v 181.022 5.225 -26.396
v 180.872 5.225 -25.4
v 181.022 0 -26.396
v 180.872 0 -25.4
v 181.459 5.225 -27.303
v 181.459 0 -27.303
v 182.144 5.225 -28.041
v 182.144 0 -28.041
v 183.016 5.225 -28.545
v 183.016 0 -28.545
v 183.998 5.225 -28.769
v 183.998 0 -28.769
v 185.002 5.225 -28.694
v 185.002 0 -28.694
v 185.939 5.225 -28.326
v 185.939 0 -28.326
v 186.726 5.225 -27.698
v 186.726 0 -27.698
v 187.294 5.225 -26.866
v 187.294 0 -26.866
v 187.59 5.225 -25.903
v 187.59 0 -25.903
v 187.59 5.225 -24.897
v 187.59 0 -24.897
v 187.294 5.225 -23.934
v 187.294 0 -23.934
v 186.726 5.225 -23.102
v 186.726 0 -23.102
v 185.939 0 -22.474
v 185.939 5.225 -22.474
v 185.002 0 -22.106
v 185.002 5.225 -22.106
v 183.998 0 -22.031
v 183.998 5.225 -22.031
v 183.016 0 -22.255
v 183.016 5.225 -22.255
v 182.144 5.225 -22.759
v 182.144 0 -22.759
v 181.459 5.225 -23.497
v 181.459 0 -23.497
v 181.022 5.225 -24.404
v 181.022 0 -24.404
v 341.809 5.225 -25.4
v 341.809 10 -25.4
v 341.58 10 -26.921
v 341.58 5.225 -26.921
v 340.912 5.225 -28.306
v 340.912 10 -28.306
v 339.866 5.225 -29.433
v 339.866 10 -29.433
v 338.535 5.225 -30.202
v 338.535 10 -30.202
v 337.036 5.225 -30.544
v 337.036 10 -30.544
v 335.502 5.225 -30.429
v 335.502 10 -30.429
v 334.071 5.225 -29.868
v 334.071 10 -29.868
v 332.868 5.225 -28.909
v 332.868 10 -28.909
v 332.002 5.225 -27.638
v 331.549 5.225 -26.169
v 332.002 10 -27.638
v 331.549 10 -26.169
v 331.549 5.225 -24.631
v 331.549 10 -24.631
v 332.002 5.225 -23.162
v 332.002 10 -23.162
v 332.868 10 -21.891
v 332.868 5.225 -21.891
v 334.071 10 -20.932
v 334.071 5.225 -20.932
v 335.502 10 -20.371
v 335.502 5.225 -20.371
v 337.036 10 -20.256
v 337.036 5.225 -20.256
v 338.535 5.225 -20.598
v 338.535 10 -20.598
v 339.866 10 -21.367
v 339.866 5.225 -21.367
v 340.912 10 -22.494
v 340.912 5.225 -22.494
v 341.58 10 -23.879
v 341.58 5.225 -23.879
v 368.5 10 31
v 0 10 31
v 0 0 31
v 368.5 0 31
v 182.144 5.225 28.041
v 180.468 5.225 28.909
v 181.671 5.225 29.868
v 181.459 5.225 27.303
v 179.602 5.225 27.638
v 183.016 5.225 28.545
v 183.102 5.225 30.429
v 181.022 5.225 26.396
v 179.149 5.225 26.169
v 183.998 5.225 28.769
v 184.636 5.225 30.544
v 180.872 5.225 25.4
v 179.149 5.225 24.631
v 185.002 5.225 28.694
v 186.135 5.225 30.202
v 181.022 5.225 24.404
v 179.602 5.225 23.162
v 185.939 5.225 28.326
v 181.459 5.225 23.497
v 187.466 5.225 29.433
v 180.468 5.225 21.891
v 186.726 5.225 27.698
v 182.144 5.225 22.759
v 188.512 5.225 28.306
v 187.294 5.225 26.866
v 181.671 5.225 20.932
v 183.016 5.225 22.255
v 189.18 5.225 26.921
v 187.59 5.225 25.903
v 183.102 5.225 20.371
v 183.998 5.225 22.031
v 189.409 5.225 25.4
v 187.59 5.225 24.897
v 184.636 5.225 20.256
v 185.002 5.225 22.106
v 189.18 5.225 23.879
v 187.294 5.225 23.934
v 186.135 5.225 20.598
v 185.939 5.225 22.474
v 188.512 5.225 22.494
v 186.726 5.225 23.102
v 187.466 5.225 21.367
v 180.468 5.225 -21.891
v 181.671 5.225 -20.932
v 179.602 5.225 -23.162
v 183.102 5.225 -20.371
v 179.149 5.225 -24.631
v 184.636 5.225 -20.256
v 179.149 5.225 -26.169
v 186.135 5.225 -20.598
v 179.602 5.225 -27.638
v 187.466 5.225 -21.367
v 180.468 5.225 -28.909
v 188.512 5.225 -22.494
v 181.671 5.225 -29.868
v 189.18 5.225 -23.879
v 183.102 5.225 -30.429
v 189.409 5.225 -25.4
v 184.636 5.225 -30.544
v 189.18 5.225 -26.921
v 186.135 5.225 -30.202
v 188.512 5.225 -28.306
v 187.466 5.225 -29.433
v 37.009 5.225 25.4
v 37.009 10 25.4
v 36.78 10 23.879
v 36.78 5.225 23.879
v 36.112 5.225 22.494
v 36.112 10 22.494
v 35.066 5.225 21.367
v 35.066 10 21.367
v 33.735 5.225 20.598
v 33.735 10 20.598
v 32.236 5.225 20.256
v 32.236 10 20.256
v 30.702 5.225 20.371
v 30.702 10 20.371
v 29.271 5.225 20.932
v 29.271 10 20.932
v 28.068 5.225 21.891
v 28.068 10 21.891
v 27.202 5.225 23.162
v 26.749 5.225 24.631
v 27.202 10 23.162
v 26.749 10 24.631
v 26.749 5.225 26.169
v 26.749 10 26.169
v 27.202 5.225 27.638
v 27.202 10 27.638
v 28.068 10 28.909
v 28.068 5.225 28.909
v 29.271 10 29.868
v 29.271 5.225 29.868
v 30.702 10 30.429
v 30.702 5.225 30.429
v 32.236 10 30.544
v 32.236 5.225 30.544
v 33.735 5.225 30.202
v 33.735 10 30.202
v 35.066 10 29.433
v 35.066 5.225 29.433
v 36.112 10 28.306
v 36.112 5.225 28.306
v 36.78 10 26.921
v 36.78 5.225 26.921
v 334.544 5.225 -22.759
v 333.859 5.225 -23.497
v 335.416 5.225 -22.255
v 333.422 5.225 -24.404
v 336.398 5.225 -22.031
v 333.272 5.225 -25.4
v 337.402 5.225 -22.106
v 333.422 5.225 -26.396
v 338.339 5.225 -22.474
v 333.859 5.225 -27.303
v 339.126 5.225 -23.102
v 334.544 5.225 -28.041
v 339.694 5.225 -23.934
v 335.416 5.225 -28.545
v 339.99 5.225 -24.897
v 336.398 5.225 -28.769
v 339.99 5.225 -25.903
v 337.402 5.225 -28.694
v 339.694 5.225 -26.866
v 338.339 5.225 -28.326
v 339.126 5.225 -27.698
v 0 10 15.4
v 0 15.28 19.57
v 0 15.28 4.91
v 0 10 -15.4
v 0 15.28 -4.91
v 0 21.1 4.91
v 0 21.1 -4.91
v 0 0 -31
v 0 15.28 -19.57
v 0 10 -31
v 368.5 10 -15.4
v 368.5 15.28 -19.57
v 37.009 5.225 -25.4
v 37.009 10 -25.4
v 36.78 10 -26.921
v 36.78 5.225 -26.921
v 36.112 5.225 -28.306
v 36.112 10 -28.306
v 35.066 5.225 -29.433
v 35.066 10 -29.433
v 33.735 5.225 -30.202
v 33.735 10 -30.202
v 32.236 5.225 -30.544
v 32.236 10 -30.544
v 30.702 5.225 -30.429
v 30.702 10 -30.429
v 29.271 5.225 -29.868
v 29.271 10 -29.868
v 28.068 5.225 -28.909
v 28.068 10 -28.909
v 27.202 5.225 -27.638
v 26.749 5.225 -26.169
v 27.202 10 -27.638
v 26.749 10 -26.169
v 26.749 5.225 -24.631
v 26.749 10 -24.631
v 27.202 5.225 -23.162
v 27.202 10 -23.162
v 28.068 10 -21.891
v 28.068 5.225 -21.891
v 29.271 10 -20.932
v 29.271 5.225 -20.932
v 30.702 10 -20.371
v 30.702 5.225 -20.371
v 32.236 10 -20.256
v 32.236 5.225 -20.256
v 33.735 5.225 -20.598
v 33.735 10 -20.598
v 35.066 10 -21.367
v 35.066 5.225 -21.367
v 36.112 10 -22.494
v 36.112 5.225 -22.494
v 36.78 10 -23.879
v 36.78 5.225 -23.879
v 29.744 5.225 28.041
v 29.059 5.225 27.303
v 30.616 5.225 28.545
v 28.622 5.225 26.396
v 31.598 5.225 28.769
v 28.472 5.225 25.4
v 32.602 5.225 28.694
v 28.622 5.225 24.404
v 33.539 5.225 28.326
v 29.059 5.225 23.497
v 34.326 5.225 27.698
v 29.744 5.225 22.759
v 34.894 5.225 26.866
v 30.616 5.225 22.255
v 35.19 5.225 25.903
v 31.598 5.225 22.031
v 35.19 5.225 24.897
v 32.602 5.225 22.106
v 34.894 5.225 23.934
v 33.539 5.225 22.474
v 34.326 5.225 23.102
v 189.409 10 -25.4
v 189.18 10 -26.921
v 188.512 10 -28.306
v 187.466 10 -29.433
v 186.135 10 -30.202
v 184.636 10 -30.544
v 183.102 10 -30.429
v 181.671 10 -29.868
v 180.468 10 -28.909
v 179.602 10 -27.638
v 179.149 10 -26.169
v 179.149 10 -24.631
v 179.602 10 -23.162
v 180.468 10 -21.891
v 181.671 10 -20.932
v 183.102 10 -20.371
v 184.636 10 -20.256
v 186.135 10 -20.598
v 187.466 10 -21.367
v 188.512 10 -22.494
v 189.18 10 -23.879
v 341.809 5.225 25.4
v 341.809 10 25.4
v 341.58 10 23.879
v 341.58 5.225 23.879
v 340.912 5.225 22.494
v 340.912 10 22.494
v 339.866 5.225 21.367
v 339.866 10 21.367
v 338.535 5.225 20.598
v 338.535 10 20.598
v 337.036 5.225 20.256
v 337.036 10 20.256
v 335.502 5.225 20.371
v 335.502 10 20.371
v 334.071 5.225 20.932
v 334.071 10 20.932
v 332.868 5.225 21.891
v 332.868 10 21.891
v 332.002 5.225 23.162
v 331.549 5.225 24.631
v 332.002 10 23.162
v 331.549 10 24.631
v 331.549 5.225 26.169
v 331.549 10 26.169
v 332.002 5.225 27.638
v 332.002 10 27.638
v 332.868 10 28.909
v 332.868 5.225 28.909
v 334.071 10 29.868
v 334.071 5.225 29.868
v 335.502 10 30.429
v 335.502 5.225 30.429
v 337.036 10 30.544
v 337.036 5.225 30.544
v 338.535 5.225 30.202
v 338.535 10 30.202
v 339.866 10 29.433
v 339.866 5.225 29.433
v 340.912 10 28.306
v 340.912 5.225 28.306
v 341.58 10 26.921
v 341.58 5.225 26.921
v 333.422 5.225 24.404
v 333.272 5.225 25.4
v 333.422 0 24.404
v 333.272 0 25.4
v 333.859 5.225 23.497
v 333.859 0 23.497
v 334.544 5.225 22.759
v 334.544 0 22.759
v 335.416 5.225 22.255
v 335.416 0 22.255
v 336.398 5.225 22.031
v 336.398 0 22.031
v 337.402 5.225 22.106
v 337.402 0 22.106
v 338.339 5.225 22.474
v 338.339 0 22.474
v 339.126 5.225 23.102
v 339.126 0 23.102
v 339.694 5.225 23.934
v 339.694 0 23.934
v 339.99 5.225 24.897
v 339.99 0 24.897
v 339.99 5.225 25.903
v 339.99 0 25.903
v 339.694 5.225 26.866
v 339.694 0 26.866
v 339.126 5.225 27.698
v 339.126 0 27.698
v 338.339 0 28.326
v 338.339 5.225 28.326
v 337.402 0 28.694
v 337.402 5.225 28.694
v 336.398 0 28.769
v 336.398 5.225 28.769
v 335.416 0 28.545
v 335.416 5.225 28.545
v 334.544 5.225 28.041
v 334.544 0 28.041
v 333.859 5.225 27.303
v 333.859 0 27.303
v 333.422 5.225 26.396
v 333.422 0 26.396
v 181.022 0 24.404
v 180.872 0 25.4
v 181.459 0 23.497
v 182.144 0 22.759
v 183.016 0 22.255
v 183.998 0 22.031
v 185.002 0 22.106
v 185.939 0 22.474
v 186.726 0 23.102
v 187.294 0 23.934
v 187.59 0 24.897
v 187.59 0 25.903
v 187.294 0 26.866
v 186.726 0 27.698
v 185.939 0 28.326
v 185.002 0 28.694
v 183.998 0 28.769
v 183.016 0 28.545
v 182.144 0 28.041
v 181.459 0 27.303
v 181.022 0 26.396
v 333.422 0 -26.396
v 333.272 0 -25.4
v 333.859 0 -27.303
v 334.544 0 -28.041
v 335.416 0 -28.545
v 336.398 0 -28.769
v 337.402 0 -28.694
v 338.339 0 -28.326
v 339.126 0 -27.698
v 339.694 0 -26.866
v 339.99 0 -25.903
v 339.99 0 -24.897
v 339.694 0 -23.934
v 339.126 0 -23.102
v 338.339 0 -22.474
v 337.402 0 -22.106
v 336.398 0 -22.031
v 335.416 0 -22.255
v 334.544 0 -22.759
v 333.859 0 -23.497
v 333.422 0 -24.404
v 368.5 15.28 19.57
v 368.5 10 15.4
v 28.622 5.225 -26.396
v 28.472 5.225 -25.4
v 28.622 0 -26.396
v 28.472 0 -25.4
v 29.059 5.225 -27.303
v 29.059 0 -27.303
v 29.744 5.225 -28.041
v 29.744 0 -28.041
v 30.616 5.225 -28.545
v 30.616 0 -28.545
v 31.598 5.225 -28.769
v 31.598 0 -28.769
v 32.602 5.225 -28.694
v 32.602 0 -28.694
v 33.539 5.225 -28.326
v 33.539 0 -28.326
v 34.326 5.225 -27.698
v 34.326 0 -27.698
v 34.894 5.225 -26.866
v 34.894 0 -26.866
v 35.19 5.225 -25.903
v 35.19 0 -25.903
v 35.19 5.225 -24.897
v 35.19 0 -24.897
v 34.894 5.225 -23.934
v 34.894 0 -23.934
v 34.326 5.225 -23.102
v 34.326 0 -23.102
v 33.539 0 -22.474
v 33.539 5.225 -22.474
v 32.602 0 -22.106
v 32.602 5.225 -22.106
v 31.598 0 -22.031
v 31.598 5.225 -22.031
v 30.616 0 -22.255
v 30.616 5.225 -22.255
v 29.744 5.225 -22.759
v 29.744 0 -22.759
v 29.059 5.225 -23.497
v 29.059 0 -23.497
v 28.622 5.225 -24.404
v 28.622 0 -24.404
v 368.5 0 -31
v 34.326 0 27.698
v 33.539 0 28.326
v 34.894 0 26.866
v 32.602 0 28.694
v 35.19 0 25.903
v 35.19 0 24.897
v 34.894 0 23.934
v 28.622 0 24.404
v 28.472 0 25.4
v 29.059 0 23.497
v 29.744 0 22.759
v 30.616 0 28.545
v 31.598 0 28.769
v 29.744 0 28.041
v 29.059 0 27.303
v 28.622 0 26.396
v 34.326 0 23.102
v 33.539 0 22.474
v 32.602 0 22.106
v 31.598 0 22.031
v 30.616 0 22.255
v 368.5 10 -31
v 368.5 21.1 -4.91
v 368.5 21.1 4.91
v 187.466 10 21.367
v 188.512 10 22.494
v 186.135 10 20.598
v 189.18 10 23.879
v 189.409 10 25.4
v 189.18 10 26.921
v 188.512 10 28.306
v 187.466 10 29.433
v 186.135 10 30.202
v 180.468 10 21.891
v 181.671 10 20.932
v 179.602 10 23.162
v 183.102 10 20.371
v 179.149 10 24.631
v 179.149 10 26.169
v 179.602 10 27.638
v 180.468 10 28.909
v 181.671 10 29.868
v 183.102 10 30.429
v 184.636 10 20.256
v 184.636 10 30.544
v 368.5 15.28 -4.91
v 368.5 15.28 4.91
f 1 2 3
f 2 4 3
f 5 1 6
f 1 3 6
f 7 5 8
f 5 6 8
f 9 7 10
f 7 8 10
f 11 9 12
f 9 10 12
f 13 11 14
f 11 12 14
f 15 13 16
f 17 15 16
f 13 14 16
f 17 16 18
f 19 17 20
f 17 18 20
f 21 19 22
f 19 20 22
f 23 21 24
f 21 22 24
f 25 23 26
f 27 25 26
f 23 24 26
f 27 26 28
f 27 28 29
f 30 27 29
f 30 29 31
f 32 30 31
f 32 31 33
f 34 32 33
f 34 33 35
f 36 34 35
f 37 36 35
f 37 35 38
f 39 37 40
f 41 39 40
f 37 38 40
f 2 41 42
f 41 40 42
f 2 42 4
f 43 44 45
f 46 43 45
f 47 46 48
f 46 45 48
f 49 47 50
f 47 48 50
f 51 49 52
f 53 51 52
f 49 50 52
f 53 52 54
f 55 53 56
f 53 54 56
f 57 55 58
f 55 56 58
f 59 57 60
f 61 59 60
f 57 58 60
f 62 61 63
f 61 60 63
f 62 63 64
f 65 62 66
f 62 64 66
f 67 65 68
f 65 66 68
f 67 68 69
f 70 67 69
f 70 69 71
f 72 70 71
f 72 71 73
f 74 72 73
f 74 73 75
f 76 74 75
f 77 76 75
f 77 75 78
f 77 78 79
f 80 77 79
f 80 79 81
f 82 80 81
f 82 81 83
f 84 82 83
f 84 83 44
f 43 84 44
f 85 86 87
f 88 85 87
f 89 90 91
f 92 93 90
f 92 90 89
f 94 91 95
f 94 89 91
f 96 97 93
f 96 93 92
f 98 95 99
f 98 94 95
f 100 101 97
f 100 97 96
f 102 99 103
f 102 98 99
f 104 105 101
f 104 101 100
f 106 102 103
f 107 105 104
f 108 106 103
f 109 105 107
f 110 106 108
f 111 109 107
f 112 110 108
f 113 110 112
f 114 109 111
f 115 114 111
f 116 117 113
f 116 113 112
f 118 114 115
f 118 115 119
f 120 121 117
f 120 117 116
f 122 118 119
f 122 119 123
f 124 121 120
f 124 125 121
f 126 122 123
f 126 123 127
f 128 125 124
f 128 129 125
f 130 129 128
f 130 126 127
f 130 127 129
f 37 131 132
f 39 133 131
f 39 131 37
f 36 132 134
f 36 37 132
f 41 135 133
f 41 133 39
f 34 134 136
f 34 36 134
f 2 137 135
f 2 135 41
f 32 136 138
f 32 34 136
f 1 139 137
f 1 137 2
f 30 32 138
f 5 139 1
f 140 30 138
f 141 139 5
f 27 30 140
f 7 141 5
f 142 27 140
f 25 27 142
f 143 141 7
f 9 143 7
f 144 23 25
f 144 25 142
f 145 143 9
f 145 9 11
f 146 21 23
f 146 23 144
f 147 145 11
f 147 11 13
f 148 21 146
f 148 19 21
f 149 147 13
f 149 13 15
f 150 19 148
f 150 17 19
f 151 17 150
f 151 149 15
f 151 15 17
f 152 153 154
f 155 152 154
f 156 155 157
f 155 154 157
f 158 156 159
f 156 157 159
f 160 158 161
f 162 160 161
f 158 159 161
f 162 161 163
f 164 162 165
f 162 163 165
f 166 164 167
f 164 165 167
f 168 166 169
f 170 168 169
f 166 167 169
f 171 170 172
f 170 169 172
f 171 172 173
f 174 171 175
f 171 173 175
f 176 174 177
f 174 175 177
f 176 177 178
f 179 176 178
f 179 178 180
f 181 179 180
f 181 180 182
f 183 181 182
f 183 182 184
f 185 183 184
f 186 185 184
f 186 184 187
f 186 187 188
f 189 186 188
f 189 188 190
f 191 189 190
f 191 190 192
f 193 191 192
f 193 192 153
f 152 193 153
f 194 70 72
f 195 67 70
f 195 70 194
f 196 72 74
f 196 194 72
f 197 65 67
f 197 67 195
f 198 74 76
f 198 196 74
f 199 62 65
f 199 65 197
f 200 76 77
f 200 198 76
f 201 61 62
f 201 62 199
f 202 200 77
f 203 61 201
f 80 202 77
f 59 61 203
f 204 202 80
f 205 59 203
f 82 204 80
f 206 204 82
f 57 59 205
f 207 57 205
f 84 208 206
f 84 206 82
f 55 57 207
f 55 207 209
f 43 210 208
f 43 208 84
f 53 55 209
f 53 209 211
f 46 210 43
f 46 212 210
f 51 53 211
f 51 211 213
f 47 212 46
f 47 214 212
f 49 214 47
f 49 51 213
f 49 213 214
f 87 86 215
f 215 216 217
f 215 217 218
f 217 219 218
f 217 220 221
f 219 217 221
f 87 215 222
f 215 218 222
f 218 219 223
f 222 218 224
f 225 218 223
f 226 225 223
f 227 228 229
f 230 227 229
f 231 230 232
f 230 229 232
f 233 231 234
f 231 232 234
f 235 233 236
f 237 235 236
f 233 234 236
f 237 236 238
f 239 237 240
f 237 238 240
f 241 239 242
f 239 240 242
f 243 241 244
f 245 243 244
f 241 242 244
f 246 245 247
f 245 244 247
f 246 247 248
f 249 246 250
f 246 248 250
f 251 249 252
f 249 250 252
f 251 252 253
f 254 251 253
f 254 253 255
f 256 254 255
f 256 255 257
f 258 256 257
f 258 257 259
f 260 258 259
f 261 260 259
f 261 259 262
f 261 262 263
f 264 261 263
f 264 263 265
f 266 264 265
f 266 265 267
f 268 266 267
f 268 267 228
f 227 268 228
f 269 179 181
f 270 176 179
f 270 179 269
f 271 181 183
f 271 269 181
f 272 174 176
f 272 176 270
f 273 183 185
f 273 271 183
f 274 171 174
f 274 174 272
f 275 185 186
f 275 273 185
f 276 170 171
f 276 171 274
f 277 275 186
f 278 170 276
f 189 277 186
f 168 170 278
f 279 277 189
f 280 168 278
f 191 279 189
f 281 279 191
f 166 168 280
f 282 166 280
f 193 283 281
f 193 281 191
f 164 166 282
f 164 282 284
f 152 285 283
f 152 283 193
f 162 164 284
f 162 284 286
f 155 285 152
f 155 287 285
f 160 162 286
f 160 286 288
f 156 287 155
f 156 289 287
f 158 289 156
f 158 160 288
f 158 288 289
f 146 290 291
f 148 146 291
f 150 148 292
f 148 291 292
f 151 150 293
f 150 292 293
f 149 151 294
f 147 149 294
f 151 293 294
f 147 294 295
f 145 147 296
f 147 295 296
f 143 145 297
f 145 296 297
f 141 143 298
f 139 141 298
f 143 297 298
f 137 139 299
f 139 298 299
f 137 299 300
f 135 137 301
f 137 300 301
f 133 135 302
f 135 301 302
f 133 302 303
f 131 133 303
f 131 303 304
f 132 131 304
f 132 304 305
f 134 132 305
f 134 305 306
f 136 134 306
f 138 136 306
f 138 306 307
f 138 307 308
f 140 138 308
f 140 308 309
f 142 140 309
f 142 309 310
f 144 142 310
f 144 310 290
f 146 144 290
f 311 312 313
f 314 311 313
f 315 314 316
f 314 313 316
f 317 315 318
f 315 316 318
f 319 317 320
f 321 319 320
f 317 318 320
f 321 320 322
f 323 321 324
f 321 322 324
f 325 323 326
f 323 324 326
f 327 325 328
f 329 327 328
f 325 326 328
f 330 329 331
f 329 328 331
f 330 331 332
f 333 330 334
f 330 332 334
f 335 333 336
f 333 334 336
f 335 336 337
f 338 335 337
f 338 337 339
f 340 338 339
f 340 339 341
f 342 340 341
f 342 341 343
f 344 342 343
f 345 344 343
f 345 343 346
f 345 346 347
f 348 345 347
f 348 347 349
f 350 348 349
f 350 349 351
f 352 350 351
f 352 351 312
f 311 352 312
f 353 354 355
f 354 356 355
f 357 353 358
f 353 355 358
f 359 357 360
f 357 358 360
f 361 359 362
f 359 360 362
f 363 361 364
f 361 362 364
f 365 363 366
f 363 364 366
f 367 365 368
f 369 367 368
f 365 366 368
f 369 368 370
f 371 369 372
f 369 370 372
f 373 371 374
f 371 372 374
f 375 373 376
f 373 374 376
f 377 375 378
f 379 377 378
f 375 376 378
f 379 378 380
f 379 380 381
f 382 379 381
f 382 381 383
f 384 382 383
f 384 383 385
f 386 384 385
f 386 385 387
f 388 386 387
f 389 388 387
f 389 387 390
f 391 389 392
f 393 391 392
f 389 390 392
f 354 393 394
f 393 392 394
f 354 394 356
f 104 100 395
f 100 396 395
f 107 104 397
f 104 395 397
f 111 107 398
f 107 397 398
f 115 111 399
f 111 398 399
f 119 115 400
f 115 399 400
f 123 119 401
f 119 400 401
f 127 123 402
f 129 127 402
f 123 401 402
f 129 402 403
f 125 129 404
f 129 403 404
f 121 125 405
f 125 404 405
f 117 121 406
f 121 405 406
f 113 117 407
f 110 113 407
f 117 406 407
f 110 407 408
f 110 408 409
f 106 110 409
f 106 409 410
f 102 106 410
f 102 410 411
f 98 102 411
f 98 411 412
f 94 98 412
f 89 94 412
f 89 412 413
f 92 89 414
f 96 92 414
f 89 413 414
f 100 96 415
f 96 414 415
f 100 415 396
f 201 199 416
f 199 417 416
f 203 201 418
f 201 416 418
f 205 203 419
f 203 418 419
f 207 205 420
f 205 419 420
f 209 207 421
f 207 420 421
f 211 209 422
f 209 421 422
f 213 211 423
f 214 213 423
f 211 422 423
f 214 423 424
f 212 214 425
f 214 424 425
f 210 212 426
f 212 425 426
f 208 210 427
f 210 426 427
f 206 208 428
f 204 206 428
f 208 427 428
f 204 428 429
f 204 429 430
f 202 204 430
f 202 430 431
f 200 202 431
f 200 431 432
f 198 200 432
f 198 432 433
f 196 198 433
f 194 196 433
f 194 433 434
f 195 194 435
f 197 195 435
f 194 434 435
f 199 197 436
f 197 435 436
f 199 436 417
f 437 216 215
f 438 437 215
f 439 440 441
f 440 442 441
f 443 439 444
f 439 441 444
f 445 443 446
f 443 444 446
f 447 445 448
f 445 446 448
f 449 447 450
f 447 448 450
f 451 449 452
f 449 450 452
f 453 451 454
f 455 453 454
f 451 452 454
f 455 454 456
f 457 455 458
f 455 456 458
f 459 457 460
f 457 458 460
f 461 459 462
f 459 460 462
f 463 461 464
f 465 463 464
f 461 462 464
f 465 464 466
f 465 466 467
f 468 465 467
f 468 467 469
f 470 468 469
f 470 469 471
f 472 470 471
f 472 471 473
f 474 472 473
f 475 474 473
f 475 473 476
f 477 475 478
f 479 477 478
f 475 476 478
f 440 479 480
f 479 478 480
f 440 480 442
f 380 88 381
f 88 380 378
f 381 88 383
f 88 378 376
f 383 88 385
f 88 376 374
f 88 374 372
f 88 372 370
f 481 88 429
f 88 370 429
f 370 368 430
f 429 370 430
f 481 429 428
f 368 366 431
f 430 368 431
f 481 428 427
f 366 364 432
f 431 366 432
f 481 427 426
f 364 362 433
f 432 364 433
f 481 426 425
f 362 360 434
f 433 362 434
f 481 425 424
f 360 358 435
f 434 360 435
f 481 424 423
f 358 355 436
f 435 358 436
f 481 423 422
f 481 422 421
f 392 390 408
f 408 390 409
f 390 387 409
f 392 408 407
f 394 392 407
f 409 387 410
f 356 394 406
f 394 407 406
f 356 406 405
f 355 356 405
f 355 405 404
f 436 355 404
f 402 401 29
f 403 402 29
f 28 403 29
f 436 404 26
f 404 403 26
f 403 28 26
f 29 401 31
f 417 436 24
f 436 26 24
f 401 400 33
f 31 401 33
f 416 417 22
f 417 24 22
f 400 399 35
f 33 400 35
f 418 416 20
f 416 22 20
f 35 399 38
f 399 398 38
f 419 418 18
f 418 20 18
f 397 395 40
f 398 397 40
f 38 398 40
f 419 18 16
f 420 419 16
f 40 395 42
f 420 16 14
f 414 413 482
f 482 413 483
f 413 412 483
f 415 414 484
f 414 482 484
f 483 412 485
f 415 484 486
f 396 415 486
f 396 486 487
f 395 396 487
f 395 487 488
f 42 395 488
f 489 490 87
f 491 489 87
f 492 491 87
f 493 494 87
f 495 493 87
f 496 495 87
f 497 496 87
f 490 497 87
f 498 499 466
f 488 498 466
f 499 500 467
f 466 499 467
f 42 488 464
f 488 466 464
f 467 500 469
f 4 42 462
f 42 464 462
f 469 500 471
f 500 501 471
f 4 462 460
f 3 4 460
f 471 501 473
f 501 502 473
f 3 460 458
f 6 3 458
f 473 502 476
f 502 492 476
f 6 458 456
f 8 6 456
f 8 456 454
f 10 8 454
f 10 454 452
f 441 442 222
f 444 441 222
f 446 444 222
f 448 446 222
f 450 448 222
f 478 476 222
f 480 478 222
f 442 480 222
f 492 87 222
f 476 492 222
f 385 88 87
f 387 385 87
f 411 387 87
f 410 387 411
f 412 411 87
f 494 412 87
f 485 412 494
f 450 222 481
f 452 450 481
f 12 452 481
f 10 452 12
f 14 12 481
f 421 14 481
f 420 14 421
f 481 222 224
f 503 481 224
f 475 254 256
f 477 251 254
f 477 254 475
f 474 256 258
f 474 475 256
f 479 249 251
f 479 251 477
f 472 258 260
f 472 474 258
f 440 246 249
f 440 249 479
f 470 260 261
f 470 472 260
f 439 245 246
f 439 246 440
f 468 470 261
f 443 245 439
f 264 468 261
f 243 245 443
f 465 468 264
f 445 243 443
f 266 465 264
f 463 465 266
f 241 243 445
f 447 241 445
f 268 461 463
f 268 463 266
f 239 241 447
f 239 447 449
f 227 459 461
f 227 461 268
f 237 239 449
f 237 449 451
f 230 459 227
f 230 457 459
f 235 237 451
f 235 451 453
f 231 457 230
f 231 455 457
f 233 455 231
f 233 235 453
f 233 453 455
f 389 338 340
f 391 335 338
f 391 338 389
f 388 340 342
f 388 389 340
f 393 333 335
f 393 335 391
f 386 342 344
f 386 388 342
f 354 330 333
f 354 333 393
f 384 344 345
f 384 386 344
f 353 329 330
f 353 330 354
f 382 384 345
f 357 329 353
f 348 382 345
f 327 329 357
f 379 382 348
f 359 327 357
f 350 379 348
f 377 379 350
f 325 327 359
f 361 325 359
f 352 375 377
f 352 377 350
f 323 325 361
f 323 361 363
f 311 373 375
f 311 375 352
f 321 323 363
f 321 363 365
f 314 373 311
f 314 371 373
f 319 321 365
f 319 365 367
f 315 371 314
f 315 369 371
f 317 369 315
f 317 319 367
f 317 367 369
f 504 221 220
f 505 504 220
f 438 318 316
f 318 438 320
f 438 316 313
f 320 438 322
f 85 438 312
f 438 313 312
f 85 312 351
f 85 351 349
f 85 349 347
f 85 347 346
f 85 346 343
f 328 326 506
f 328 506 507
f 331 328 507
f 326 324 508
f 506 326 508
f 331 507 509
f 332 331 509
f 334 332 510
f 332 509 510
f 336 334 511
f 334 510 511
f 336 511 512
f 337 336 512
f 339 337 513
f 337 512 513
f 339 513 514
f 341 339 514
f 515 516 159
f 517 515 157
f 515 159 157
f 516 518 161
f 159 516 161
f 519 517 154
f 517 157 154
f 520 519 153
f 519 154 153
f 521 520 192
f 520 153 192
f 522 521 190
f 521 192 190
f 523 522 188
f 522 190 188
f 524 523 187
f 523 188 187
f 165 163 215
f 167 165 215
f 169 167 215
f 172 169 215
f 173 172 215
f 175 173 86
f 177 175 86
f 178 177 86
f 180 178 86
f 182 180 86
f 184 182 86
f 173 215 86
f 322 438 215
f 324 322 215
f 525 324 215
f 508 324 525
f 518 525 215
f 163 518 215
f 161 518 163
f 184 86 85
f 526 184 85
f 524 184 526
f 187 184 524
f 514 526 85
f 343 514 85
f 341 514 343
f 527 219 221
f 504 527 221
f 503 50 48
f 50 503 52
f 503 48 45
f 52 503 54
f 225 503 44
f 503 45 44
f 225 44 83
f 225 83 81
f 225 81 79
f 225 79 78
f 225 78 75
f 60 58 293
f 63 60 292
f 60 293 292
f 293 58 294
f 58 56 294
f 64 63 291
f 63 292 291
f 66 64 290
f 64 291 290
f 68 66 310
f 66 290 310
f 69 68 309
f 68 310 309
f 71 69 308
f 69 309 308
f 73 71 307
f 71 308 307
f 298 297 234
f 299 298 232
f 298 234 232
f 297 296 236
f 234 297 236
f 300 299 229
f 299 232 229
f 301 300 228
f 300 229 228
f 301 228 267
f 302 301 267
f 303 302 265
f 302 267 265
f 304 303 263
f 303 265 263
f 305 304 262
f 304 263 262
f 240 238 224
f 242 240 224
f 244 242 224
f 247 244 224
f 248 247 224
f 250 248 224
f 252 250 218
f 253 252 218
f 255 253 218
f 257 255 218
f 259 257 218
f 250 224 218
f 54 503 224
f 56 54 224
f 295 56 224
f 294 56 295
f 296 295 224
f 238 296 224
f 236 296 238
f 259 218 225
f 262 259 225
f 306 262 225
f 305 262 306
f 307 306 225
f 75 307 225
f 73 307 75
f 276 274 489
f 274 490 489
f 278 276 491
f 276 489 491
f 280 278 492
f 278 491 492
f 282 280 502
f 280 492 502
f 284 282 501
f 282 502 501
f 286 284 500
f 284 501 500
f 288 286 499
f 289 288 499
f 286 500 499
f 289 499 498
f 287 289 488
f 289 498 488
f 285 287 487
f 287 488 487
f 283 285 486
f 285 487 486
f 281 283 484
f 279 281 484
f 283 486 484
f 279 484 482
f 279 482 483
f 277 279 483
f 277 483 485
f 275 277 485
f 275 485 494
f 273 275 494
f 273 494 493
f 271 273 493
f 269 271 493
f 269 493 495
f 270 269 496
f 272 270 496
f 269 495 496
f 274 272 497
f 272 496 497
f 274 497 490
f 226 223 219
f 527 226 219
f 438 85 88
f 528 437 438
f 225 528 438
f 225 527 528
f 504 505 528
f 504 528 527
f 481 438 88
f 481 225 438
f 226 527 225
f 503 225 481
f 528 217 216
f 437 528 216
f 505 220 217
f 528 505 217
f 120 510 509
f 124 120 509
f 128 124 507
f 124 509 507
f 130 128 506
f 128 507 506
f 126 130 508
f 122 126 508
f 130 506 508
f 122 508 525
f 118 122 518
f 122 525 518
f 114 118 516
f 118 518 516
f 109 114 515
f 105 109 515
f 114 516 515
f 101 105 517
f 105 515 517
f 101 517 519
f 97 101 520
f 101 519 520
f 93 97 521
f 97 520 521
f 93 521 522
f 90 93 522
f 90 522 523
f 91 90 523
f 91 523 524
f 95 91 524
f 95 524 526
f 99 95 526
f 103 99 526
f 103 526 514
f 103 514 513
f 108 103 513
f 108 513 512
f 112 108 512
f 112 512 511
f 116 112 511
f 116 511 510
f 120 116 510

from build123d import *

# Parameters (mm, degrees)
BOSS_EXTRUDE1_DEPTH                              = 368.5
CBORE_FOR_1_4_SOCKET_SHOULDER_SCREW1_D           = 6.7564
CBORE_FOR_1_4_SOCKET_SHOULDER_SCREW1_CBORE_D     = 10.31748
CBORE_FOR_1_4_SOCKET_SHOULDER_SCREW1_CBORE_DEPTH = 4.7752


with BuildPart() as part:
    # Sketch1 → Boss-Extrude1 (new body)
    with BuildSketch(Plane(origin=(0, 0, 0), x_dir=(0, 0, -1), z_dir=(1, 0, 0))):
        Polygon((-31, 0), (31, 0), (31, 10), (15.4, 10), (19.57, 15.28), (4.91, 15.28), (4.91, 21.1), (-4.91, 21.1), (-4.91, 15.28), (-19.57, 15.28), (-15.4, 10), (-31, 10), align=None)
    extrude(amount=BOSS_EXTRUDE1_DEPTH)

    # CBORE for 1/4 Socket Shoulder Screw1 (through all)
    with Locations(Plane(origin=(0, 10, 0), x_dir=(1, 0, 0), z_dir=(0, 1, 0))):
        with Locations((31.85, 25.4), (184.25, 25.4), (336.65, 25.4), (336.65, -25.4), (184.25, -25.4), (31.85, -25.4)):
            CounterBoreHole(CBORE_FOR_1_4_SOCKET_SHOULDER_SCREW1_D / 2, CBORE_FOR_1_4_SOCKET_SHOULDER_SCREW1_CBORE_D / 2, CBORE_FOR_1_4_SOCKET_SHOULDER_SCREW1_CBORE_DEPTH)


solid = part.part
